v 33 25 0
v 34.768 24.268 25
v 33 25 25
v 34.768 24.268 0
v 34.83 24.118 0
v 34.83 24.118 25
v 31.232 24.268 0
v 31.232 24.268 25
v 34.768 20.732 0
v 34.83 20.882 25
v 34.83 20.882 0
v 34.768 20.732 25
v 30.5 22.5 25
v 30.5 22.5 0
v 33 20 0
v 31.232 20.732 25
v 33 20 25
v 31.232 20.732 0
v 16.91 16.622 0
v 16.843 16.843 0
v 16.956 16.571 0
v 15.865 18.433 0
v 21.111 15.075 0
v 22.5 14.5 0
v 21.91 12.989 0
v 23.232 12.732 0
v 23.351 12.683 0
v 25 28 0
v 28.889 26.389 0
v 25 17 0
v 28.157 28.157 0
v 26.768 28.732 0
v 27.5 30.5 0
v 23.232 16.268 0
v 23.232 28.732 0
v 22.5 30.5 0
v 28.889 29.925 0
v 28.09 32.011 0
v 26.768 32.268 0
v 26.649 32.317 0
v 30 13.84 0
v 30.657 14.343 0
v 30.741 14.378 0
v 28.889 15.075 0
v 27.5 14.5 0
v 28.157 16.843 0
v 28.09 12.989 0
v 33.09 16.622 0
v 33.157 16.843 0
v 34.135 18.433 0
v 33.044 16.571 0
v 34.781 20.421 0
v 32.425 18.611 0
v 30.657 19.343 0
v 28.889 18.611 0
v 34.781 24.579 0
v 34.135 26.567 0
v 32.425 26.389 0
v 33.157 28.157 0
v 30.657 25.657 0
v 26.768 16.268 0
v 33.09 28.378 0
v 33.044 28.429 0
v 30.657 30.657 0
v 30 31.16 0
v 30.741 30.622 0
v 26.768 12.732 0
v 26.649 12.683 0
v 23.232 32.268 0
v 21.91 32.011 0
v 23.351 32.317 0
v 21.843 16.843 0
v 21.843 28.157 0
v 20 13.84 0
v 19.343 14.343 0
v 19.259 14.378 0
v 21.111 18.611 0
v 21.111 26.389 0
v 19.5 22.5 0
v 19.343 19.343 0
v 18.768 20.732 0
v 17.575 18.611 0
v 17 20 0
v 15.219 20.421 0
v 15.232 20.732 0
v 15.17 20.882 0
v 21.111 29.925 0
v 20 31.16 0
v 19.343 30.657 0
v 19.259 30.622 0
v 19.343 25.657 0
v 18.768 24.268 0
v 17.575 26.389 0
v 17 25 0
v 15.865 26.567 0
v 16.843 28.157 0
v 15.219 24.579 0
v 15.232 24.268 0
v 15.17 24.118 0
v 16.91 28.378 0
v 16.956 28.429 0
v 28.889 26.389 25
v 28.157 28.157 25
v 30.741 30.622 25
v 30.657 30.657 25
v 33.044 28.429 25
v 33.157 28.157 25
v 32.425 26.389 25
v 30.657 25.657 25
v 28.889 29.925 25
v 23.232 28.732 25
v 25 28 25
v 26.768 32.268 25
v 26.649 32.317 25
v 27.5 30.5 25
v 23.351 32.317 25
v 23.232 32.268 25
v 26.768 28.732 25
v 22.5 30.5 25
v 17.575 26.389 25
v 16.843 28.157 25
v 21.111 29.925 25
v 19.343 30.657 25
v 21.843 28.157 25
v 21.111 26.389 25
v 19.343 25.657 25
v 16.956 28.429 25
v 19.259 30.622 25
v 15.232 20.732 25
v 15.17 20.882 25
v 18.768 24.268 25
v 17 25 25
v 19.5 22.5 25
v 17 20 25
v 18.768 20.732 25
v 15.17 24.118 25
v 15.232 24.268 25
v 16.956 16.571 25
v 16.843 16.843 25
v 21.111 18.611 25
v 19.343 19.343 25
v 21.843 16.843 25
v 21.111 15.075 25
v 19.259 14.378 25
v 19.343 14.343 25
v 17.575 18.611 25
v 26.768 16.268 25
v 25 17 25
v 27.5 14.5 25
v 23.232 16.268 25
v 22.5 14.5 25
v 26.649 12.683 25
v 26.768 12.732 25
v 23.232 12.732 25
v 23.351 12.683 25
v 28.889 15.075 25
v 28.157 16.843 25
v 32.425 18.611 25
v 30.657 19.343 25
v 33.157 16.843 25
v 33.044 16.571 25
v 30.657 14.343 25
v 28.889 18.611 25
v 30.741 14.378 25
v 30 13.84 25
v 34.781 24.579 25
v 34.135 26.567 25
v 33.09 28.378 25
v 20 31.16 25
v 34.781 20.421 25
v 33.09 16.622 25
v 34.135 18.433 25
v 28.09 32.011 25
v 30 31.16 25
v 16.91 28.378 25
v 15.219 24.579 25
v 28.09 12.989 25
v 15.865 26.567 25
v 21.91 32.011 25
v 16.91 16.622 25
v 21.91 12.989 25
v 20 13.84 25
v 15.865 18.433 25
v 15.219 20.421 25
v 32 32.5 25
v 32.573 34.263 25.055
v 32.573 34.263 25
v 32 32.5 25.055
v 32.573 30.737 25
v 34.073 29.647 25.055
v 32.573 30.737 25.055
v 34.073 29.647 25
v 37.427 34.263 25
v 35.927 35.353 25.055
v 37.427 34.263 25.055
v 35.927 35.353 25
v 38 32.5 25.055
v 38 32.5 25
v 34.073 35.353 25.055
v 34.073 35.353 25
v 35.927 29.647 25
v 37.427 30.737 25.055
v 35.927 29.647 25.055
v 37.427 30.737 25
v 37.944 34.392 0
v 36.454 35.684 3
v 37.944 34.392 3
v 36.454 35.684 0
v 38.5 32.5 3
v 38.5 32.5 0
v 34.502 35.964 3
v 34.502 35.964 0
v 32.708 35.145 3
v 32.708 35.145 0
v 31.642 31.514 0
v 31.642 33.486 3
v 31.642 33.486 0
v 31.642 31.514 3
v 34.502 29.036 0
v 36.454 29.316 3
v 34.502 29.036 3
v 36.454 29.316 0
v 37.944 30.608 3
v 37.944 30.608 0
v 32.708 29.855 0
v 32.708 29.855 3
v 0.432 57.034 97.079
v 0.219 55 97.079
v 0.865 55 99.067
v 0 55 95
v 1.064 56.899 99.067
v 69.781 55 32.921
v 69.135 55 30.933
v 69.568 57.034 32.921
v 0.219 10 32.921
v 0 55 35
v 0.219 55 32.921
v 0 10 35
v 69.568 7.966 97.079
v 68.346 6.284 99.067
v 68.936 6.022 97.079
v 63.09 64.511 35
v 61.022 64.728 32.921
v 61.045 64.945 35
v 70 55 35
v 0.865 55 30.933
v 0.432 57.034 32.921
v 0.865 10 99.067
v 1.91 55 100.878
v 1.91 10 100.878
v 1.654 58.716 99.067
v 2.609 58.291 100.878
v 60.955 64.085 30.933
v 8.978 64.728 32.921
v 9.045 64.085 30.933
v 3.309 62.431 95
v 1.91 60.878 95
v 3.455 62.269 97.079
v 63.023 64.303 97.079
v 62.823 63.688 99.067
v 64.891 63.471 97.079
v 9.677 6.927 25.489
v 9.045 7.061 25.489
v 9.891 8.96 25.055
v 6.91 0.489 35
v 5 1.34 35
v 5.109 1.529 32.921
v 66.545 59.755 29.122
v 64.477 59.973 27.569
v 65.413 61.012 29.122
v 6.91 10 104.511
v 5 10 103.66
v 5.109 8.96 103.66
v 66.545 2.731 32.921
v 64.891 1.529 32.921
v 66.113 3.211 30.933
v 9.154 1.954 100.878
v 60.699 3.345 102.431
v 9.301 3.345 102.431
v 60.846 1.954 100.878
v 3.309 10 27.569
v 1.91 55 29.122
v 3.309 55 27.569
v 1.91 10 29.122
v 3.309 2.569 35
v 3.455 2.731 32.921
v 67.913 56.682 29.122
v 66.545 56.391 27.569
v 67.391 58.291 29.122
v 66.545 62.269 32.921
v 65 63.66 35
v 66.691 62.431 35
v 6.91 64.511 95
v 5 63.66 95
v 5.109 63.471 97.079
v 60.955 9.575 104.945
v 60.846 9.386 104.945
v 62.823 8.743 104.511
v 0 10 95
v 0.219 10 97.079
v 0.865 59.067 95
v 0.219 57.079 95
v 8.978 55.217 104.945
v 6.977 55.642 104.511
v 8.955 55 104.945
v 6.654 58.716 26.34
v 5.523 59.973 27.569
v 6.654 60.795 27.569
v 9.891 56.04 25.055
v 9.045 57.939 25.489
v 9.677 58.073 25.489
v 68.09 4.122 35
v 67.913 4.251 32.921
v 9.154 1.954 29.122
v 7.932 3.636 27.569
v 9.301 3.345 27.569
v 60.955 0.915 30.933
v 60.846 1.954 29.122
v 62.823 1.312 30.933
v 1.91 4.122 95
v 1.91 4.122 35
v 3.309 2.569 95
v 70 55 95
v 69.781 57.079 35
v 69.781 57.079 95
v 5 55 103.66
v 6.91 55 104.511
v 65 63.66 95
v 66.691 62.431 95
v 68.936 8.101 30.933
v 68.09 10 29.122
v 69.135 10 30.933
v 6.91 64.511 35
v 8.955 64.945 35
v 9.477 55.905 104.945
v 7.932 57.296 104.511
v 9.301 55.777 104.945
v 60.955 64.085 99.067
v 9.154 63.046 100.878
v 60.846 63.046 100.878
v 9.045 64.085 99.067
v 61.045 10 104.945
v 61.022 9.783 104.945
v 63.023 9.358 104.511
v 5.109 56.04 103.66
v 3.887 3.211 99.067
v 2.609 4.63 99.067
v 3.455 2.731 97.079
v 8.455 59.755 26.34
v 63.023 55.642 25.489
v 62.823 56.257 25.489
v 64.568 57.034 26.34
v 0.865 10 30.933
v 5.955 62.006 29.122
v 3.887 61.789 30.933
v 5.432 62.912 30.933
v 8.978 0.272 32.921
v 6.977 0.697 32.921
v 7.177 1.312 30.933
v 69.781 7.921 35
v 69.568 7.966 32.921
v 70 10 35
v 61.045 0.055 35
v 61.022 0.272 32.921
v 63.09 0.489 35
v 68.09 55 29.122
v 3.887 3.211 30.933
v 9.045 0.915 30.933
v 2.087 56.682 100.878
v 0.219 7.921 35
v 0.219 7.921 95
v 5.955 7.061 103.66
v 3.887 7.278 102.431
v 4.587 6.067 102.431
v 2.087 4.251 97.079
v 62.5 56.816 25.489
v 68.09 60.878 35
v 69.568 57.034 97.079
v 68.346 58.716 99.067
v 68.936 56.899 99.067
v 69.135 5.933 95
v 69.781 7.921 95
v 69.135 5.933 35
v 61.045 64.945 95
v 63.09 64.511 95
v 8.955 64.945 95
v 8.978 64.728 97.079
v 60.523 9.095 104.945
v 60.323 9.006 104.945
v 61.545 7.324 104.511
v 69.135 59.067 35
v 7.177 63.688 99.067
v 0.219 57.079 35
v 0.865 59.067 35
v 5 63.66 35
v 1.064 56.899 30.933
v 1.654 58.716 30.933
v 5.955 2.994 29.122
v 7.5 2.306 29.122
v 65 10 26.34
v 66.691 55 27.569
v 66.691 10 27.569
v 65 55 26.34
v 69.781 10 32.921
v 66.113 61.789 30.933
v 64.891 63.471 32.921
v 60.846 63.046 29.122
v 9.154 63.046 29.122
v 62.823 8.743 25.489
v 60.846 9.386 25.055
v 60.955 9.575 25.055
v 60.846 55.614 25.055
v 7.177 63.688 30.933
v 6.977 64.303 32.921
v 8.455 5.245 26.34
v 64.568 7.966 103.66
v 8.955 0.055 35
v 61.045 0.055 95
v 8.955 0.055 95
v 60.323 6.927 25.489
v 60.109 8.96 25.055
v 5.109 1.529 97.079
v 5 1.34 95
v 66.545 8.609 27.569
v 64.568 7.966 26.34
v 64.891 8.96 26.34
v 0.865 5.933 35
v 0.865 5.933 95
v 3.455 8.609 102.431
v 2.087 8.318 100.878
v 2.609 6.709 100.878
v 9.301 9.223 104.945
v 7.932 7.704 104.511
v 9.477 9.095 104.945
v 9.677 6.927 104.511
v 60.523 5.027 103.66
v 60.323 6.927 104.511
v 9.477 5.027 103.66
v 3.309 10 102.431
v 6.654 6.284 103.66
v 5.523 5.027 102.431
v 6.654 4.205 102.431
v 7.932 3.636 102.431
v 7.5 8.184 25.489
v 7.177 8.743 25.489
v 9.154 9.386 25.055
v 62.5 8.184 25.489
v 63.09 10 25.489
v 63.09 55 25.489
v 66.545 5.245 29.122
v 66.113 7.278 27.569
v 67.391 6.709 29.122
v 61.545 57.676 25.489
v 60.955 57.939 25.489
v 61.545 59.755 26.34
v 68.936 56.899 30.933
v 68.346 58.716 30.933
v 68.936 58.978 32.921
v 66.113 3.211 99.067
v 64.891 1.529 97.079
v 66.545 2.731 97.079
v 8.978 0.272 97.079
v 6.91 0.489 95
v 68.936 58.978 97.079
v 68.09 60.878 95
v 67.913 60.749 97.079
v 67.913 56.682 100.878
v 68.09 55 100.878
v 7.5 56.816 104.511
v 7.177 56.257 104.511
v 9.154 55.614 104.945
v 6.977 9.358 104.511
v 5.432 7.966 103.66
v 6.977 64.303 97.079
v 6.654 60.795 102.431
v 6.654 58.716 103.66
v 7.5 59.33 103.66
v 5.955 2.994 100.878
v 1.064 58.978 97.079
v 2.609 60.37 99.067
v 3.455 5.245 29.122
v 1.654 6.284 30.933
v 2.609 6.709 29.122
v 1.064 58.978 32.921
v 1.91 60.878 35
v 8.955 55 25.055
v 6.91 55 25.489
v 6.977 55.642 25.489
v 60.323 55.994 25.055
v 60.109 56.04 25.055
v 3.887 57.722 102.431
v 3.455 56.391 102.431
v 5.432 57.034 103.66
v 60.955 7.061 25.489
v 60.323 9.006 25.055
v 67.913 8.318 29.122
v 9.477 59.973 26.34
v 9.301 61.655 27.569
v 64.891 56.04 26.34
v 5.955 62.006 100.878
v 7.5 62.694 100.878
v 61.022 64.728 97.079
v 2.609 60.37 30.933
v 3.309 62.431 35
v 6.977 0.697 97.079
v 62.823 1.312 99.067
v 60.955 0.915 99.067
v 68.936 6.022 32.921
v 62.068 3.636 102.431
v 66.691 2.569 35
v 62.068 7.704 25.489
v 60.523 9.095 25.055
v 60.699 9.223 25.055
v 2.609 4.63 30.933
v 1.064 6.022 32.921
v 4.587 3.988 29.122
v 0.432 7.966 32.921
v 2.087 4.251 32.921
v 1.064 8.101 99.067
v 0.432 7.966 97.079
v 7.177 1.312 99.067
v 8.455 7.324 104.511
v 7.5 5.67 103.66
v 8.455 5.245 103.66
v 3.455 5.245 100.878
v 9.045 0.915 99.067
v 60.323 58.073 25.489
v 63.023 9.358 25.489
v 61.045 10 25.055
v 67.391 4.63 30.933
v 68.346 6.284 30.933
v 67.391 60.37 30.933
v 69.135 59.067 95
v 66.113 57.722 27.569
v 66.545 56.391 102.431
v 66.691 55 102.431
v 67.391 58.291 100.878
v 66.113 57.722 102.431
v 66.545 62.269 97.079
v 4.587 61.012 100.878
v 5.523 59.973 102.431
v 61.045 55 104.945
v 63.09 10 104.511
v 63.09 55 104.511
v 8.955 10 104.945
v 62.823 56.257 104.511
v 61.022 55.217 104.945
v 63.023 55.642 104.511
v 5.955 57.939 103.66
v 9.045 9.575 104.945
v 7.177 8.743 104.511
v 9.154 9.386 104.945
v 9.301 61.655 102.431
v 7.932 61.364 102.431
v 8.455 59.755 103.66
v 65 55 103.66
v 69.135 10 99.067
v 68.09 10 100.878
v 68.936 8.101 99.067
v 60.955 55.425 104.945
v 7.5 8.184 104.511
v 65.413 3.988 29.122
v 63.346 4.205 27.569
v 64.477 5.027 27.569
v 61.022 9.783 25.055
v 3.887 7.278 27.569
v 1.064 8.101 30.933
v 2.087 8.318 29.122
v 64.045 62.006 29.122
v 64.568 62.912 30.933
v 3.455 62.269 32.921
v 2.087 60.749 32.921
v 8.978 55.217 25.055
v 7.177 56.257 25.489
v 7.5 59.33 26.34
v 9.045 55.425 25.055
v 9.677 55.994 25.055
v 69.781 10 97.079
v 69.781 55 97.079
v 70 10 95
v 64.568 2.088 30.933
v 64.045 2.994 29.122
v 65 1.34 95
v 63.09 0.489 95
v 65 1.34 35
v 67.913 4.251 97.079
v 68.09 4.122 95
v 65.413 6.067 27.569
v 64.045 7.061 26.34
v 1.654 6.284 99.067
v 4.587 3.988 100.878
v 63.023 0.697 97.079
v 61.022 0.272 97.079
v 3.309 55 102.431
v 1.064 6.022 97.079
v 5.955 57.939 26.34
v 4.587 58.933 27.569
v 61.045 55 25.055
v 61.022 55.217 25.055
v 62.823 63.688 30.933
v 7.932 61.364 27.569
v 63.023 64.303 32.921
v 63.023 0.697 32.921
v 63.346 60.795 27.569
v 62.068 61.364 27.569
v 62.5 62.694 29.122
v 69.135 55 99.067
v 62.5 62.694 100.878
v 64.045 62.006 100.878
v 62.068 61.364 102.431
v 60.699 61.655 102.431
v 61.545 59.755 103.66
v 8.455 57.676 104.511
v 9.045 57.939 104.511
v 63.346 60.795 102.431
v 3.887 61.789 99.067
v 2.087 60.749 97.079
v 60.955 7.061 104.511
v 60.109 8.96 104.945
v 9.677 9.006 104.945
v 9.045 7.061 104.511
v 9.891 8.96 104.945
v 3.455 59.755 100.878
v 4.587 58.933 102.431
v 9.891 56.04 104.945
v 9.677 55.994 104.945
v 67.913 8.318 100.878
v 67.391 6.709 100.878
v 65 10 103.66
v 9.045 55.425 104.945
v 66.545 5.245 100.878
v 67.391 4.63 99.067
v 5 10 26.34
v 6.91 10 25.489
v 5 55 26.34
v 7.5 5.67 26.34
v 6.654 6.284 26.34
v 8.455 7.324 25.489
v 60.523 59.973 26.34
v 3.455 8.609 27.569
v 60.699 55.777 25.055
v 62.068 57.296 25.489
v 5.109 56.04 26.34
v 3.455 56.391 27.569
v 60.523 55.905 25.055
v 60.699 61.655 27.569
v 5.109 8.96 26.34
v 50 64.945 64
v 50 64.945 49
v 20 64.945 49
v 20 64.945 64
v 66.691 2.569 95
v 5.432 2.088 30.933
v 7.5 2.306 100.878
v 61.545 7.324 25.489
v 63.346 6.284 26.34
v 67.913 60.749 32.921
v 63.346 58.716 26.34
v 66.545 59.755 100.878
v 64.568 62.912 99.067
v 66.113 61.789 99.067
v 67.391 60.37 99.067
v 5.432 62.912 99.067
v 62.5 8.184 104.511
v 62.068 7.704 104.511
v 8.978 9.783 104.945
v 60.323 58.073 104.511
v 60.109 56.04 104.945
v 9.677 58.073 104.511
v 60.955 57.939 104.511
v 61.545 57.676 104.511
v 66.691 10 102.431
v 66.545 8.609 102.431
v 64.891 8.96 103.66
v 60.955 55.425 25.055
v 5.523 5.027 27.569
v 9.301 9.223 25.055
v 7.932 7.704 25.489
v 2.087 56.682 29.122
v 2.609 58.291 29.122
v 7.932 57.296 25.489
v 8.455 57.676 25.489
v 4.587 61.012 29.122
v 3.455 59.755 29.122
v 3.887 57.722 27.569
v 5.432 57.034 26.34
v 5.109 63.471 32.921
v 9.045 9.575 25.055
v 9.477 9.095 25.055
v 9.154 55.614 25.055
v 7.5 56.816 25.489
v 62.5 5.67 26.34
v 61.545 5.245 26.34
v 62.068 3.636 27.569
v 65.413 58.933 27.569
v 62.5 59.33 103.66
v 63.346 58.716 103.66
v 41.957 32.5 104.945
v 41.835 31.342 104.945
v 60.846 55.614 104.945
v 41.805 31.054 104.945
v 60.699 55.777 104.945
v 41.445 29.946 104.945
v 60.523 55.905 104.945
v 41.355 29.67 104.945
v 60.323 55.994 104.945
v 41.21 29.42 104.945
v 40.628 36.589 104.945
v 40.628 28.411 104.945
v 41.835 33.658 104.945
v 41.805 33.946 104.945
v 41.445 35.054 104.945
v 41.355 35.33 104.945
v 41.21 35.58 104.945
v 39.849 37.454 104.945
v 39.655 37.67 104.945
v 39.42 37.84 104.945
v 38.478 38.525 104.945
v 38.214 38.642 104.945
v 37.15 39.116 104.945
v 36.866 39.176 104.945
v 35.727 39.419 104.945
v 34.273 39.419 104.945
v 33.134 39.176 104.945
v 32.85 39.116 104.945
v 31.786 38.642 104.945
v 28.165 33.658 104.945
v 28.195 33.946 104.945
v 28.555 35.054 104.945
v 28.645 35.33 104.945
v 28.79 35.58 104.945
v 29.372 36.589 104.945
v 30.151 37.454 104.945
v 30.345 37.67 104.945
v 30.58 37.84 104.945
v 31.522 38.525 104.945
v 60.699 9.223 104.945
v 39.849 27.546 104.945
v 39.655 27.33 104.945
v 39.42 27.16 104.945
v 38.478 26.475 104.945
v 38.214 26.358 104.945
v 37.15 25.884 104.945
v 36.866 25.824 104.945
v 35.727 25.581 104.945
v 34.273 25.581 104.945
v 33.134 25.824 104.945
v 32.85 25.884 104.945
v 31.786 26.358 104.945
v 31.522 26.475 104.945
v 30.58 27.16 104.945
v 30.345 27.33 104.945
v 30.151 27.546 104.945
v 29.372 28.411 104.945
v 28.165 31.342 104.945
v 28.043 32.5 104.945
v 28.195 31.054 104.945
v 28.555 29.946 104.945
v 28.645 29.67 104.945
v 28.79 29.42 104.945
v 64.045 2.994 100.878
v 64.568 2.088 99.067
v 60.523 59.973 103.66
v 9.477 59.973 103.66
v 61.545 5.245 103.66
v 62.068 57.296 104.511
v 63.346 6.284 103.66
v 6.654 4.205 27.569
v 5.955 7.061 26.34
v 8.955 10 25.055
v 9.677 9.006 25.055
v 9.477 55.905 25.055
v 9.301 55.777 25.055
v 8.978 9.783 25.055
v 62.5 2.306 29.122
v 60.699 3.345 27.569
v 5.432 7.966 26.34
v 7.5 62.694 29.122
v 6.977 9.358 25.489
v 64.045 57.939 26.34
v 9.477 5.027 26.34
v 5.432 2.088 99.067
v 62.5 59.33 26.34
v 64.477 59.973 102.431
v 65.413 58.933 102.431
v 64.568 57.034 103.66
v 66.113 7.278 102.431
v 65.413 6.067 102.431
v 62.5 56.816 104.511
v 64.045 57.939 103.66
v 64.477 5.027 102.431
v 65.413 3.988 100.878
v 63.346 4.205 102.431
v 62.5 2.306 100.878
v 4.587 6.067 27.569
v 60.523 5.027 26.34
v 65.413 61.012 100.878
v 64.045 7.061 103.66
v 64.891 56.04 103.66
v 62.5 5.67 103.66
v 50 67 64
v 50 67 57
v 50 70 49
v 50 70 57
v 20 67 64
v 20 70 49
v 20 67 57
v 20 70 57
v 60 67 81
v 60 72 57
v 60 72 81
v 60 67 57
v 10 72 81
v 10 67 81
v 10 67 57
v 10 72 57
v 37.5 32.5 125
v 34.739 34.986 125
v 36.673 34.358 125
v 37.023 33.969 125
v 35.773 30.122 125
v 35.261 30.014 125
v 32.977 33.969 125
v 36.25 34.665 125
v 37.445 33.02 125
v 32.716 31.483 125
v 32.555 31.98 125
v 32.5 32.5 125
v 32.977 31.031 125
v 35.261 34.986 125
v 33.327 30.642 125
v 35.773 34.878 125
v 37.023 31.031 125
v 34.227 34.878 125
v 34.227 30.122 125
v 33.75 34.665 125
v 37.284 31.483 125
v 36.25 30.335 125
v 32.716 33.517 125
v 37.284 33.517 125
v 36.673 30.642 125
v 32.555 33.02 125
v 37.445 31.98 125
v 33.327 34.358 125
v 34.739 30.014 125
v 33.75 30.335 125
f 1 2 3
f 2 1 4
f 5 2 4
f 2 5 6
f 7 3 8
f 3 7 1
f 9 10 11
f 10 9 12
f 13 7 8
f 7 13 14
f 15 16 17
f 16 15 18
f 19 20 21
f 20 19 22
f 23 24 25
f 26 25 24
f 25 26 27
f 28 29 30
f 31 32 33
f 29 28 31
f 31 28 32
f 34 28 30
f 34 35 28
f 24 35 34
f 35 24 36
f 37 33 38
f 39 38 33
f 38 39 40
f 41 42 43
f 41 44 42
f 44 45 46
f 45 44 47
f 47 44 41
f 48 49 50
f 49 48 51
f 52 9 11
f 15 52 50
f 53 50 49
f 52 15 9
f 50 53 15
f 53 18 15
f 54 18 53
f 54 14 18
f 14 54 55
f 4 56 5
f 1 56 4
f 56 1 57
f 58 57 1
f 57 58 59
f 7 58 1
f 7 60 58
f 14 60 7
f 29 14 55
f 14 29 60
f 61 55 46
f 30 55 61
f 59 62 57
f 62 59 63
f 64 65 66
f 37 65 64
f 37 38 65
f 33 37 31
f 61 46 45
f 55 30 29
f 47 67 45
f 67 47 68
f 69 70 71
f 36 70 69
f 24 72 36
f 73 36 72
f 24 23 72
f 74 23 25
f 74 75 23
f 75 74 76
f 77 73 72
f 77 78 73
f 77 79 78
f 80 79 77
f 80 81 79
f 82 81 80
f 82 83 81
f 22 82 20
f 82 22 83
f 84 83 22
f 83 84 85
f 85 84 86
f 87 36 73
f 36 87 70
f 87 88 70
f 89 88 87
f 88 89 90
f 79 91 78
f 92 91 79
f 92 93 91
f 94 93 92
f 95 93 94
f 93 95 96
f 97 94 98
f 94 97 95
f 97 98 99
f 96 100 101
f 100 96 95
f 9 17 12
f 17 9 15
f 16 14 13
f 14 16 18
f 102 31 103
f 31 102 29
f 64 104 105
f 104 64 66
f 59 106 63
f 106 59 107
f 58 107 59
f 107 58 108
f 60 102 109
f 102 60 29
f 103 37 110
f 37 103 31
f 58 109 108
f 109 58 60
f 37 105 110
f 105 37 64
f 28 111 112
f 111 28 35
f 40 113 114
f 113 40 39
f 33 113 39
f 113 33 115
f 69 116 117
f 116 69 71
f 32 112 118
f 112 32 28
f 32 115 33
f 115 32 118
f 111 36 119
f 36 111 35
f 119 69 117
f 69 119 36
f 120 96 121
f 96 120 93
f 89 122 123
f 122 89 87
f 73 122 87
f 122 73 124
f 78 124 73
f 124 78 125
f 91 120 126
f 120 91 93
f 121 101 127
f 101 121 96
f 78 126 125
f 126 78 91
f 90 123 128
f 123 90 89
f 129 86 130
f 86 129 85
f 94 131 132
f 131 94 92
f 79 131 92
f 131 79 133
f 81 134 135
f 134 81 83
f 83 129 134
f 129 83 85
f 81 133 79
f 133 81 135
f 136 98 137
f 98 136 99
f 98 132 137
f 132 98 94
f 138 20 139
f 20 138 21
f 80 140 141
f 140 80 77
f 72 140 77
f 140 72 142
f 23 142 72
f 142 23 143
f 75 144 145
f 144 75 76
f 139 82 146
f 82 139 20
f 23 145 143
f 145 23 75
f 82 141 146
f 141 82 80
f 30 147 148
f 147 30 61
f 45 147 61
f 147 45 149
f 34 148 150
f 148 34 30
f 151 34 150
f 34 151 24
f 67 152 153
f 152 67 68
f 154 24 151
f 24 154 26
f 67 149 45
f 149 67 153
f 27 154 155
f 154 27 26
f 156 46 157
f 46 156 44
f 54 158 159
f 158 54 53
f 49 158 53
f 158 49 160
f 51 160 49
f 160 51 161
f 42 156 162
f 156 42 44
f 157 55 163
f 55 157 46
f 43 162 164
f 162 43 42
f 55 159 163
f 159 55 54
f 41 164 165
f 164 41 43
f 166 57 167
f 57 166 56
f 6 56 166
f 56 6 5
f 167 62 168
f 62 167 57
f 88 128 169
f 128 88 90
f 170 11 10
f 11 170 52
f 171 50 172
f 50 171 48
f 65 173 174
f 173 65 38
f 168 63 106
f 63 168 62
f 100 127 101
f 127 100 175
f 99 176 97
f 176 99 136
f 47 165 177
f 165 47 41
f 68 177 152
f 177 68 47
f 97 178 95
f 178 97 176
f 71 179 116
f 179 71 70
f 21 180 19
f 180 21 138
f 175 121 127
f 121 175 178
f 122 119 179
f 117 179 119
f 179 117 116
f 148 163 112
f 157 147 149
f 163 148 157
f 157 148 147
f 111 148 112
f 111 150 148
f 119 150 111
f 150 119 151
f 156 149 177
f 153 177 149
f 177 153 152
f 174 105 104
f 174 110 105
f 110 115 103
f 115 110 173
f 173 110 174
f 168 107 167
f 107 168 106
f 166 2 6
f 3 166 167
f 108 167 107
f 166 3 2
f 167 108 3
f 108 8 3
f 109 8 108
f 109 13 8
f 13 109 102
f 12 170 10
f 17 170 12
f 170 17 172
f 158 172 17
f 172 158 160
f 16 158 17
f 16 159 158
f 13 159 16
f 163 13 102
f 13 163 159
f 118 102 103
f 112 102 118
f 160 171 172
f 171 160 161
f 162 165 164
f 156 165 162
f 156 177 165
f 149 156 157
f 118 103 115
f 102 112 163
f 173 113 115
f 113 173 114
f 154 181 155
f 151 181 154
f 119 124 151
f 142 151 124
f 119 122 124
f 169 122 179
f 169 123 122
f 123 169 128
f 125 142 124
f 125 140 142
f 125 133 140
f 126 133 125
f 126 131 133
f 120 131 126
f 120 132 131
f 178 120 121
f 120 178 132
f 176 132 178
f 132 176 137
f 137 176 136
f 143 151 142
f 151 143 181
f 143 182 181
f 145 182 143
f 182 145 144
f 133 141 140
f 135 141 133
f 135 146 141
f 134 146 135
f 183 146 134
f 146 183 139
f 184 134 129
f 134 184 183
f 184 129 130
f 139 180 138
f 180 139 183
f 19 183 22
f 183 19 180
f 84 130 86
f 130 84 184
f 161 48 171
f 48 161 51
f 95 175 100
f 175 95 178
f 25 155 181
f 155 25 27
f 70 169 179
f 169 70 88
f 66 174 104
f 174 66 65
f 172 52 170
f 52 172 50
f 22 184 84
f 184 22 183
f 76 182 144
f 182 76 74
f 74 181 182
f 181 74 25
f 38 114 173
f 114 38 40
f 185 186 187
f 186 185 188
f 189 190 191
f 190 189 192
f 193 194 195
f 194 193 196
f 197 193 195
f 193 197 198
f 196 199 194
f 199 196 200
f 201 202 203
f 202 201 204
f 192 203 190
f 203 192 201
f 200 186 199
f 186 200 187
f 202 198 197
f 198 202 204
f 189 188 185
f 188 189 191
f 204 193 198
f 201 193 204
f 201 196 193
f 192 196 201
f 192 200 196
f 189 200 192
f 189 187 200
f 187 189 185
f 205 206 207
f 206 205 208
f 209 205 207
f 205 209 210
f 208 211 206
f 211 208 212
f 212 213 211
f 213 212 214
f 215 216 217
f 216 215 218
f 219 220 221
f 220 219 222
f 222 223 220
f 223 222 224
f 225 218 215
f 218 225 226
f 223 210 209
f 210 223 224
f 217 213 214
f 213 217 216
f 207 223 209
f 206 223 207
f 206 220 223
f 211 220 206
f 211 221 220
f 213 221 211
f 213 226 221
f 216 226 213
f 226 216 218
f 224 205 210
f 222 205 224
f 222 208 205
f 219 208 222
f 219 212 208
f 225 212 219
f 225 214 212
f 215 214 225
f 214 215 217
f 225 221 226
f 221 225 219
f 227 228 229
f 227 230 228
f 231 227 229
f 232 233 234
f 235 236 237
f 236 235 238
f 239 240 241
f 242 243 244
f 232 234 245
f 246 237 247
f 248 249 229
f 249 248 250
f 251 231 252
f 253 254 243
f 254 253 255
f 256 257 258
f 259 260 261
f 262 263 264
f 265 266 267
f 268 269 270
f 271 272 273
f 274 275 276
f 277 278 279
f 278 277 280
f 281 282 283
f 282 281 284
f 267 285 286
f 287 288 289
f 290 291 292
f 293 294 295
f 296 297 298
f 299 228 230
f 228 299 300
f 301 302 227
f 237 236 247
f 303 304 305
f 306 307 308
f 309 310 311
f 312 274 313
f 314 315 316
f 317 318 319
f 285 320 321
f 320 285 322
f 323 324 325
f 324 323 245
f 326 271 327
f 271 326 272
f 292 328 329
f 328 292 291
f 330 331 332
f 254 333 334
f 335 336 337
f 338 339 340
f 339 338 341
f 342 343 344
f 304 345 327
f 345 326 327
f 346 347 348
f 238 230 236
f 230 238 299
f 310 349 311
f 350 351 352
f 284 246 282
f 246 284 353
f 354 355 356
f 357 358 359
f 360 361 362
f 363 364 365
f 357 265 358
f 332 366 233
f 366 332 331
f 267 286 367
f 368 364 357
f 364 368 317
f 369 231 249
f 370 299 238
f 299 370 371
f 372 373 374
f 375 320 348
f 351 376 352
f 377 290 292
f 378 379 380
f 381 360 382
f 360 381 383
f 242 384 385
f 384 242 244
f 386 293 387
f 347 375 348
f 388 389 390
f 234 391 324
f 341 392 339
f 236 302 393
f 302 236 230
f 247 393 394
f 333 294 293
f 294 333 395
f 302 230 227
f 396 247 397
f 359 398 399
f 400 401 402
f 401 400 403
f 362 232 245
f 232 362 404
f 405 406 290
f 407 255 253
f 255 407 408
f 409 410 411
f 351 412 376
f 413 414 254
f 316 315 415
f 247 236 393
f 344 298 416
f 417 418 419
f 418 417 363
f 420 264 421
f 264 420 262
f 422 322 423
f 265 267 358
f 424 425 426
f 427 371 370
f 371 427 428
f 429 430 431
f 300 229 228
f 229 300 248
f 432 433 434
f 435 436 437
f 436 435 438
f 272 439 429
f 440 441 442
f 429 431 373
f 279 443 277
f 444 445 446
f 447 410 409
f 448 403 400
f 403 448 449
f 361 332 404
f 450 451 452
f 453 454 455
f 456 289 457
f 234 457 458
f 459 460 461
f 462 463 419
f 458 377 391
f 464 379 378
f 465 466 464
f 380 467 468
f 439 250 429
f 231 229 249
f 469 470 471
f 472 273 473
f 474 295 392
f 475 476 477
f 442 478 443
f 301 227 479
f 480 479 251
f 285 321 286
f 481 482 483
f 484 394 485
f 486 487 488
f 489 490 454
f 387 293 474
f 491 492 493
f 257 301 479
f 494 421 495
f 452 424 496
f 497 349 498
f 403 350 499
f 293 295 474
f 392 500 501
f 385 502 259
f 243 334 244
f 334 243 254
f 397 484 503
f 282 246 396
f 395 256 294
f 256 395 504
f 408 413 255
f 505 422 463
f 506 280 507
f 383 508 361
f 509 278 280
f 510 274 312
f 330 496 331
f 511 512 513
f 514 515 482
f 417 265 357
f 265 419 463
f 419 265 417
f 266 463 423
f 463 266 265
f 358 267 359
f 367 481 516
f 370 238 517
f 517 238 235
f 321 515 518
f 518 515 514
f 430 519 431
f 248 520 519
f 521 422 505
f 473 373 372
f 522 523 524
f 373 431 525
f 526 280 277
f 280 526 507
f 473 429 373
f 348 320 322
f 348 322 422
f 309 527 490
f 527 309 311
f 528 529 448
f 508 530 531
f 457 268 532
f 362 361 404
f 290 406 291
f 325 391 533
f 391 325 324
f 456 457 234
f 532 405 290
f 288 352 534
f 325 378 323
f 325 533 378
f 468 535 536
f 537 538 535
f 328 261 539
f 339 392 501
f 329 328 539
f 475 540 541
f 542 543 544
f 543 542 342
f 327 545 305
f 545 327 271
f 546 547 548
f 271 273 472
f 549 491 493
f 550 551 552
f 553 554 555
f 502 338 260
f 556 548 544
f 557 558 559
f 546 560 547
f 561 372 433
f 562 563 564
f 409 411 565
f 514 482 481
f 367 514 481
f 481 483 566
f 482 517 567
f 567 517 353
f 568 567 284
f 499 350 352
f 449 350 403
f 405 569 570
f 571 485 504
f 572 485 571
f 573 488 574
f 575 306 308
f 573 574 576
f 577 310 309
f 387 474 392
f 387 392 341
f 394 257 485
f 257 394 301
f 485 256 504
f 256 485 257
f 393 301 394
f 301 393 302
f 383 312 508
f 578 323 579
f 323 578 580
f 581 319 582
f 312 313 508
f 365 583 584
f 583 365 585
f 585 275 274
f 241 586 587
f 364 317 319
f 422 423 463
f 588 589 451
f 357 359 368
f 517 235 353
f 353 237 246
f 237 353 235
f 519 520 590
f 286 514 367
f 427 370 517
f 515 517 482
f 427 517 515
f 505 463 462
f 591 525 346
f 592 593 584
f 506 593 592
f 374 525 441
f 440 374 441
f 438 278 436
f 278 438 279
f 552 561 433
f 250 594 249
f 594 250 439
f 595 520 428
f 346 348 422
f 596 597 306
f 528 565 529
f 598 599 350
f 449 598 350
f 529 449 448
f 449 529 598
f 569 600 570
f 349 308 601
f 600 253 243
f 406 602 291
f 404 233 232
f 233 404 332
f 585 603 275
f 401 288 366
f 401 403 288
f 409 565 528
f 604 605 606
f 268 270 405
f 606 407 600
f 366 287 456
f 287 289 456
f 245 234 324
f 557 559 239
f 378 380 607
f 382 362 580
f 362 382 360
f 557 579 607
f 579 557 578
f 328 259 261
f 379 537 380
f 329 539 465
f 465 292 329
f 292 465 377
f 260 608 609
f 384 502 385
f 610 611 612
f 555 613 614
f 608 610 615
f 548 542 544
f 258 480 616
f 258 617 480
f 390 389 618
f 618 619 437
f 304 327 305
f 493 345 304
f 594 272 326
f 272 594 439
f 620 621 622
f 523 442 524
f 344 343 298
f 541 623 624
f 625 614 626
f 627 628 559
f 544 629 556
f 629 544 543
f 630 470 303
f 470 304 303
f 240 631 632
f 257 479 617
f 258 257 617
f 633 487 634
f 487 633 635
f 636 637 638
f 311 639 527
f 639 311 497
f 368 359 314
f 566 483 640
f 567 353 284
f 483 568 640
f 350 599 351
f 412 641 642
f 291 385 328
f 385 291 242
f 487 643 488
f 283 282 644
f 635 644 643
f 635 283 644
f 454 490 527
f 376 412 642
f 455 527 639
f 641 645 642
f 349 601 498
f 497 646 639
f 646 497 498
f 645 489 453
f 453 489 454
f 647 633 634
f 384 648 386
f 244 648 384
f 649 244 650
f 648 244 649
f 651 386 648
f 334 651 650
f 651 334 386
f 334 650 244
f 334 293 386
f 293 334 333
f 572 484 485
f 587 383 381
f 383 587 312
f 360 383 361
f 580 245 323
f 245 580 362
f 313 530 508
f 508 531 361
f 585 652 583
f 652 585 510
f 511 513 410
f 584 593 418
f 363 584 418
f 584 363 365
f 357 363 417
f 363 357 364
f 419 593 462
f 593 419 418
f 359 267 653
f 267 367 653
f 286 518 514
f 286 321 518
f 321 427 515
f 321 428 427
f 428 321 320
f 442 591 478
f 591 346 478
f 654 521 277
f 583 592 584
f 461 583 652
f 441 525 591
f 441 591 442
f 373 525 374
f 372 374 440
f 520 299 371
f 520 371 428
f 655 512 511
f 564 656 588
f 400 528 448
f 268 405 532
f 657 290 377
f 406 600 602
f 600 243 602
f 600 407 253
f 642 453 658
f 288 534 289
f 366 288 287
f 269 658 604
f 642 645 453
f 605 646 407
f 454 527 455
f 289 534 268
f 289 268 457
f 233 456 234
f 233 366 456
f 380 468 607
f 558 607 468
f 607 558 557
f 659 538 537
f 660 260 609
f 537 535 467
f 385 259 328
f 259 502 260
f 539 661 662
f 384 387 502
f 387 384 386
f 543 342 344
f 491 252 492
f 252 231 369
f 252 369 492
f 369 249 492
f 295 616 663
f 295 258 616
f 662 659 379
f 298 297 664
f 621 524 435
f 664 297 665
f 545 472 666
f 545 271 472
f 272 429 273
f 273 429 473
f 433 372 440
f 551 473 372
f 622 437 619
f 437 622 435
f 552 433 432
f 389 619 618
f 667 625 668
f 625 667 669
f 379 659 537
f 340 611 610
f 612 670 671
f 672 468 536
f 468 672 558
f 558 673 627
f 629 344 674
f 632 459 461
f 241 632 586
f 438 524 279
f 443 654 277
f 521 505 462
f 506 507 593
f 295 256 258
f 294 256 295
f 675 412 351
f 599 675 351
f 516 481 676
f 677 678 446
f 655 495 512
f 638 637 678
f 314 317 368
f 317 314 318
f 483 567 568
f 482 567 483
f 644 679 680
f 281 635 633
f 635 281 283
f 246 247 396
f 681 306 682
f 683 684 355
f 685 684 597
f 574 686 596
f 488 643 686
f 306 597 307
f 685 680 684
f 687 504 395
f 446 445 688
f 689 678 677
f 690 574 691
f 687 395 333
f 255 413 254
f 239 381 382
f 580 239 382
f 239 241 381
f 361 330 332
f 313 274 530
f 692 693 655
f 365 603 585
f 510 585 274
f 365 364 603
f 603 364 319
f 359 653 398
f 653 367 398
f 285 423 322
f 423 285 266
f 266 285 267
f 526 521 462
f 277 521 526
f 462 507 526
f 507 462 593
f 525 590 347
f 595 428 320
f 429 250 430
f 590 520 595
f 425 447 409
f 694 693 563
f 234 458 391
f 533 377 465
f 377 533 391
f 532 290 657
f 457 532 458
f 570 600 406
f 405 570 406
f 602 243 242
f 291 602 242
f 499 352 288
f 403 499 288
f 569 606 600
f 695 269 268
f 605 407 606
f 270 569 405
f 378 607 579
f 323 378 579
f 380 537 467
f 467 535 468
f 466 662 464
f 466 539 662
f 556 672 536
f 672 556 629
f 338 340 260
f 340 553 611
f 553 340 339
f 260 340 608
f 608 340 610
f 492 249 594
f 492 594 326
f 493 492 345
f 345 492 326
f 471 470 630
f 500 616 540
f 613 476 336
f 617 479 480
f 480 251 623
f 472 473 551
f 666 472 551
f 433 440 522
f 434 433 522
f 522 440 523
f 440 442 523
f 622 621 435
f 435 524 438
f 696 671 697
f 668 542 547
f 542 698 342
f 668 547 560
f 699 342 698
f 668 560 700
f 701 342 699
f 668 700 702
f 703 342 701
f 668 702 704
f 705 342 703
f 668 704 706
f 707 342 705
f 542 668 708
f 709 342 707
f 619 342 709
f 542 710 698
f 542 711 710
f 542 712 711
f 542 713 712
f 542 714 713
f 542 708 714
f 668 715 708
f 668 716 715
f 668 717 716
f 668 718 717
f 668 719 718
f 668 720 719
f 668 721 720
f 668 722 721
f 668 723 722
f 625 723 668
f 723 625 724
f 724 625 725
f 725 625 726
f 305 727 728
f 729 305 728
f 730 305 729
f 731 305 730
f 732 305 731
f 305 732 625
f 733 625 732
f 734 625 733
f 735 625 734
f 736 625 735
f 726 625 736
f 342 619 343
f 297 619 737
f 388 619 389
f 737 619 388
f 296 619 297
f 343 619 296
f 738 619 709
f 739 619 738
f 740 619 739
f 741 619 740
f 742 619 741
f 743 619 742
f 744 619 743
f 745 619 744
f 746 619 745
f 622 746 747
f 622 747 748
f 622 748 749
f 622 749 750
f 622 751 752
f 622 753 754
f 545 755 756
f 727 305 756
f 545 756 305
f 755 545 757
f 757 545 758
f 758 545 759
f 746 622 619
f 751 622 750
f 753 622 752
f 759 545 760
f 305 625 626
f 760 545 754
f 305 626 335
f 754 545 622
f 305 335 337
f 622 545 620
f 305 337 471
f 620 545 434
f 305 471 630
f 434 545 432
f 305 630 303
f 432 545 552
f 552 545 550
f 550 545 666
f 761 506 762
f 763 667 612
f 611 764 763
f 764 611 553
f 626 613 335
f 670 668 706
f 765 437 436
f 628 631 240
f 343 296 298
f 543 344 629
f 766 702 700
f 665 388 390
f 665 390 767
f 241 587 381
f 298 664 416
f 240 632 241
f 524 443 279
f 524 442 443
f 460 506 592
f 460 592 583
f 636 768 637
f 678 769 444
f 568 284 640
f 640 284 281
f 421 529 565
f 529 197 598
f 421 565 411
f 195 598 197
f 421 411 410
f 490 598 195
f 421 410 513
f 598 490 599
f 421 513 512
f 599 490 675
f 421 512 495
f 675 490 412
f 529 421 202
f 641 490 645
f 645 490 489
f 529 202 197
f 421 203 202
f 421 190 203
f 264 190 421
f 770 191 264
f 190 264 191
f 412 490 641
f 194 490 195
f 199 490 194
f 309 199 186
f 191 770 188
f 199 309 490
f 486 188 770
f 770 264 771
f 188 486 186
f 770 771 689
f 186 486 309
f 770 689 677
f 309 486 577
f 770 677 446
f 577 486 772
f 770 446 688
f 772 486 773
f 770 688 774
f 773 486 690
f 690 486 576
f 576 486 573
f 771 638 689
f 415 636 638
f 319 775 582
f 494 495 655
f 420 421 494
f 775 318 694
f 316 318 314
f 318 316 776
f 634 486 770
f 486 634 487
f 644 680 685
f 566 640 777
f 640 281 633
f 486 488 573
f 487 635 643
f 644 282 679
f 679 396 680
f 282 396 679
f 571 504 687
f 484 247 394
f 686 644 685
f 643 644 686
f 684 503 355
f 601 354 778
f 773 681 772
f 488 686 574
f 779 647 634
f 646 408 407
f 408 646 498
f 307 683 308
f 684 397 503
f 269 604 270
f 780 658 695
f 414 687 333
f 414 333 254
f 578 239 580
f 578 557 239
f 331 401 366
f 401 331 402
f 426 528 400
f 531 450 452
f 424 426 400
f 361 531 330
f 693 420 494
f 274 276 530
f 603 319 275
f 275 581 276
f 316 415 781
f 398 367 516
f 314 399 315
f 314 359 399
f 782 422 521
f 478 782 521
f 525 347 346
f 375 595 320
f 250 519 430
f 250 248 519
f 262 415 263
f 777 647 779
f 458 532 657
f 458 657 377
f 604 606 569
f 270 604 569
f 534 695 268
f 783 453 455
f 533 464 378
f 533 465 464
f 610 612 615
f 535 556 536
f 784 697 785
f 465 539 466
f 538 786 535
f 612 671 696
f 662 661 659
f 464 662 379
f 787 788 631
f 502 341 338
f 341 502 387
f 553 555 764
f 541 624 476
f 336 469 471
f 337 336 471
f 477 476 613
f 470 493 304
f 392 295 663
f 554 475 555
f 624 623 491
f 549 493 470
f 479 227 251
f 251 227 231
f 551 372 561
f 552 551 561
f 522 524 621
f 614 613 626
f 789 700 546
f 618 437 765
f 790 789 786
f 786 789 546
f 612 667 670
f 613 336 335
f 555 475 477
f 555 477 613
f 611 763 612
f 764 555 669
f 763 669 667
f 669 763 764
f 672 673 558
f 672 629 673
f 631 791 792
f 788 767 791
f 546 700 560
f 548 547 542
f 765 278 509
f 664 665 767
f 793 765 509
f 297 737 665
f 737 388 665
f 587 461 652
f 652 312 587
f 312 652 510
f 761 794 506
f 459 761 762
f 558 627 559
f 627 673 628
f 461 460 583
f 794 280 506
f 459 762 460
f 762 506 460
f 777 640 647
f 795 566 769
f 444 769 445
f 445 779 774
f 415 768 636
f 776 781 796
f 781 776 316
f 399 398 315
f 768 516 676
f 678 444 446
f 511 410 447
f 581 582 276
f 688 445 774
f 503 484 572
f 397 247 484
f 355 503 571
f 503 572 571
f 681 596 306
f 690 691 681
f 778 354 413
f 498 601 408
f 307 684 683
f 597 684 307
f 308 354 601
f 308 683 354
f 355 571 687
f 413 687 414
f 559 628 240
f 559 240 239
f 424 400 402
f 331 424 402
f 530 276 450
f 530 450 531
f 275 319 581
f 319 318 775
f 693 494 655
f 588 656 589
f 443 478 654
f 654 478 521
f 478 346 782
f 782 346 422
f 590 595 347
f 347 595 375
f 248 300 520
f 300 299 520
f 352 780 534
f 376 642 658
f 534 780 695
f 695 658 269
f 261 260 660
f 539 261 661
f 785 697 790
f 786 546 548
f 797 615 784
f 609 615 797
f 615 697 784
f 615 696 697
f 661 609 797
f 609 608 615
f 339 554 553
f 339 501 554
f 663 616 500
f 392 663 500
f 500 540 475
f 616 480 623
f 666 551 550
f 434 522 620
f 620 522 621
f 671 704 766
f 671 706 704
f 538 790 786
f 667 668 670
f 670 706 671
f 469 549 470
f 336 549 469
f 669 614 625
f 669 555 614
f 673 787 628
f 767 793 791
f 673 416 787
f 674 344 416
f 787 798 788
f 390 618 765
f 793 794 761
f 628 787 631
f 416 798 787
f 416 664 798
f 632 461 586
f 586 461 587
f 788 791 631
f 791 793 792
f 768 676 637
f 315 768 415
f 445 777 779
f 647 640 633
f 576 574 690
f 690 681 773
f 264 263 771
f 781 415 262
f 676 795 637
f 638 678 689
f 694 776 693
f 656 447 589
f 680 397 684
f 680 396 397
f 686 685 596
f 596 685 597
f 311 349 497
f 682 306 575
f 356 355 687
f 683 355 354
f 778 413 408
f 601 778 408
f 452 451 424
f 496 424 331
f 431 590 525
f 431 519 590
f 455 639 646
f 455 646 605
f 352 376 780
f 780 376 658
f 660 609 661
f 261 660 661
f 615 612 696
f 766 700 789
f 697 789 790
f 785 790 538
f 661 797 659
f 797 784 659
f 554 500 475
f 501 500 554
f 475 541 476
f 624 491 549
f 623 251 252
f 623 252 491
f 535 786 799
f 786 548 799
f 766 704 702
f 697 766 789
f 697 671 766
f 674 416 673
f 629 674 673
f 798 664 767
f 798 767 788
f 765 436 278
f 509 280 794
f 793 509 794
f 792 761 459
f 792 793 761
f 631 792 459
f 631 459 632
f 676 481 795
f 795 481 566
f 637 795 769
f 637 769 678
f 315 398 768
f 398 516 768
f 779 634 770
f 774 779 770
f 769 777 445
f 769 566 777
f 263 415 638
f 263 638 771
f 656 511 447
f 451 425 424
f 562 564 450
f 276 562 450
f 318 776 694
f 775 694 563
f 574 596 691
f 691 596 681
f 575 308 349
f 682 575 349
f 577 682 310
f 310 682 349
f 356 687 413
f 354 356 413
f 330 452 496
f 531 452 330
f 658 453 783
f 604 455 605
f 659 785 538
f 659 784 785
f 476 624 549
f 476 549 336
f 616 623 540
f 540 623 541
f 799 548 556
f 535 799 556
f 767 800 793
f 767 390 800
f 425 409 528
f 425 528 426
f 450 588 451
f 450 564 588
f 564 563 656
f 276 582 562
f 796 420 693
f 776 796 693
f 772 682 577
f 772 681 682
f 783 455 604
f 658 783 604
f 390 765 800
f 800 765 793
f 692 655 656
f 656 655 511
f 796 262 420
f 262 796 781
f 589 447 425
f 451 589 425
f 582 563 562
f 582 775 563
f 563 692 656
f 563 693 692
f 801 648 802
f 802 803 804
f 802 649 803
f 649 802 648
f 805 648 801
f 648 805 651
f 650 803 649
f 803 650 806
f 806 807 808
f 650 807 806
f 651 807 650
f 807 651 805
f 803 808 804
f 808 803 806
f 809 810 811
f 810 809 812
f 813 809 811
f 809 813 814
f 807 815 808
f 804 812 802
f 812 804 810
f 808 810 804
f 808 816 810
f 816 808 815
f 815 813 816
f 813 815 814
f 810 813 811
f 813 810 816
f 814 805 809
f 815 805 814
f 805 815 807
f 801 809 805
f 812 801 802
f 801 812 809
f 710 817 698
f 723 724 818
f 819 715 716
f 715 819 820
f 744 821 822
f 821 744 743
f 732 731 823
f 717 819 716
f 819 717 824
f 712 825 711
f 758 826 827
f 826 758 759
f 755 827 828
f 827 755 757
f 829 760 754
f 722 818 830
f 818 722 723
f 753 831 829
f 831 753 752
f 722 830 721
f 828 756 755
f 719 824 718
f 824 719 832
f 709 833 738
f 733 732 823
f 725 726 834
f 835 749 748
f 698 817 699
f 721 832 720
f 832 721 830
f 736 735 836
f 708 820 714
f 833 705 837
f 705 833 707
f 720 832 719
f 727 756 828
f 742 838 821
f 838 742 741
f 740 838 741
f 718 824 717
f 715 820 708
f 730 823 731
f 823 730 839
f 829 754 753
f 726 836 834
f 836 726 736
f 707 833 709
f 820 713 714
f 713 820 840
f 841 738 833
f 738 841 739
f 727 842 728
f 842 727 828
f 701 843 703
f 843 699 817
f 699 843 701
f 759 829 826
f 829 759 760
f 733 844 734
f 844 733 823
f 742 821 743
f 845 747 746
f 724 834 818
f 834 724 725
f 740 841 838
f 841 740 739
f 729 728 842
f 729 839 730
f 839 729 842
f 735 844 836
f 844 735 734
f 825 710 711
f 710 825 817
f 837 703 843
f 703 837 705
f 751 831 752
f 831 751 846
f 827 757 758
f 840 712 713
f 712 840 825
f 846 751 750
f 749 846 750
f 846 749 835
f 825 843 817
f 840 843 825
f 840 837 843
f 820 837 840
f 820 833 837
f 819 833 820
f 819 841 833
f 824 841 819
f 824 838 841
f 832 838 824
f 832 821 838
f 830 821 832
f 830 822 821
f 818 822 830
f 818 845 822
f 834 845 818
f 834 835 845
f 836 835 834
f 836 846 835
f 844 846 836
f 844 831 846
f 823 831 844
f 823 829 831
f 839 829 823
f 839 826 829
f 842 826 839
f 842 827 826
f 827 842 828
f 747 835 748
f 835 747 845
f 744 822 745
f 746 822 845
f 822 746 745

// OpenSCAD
// PERCY UNIT v1 - HEAD AND NECK MODULE WITH SNAP-FITS
// Connects to chest plate via neck

// Parameters
neck_dia = 20;
neck_length = 25;
neck_depth = 15;

head_width = 70;
head_height = 80;
head_depth = 65;

eye_dia = 25;
eye_spacing = 30;
eye_offset_z = 10;

ear_height = 45;
ear_width = 25;
ear_depth = 15;
ear_offset_x = 40;
ear_offset_z = 50;

snap_dia = 6;
snap_height = 5;

// NECK MODULE
module neck() {
    // Main neck cylinder
    difference() {
        cylinder(d=neck_dia, h=neck_length);
        
        // Lightening holes
        for (angle = [0:45:359]) {
            translate([neck_dia*0.4 * cos(angle), neck_dia*0.4 * sin(angle), 0])
                cylinder(d=5, h=neck_length + 1);
        }
    }
    
    // Top snap-fit male (for head connection)
    translate([neck_dia/2, neck_dia/2, neck_length])
        cylinder(d=snap_dia, h=snap_height);
    
    // Bottom snap-fit female (for chest connection)
    translate([neck_dia/2, neck_dia/2, 0])
        cylinder(d=snap_dia + 1, h=3);
}

// HEAD MODULE
module percy_head() {
    // Main head shape (rounded box)
    hull() {
        translate([10, 10, 10])
            sphere(r=10);
        translate([head_width - 10, 10, 10])
            sphere(r=10);
        translate([10, head_depth - 10, 10])
            sphere(r=10);
        translate([head_width - 10, head_depth - 10, 10])
            sphere(r=10);
        translate([10, 10, head_height - 10])
            sphere(r=10);
        translate([head_width - 10, 10, head_height - 10])
            sphere(r=10);
        translate([10, head_depth - 10, head_height - 10])
            sphere(r=10);
        translate([head_width - 10, head_depth - 10, head_height - 10])
            sphere(r=10);
    }
    
    // Eye sockets (large holes for LED eyes)
    eye_x_start = head_width/2 - eye_spacing/2;
    eye_x_end = head_width/2 + eye_spacing/2;
    
    translate([eye_x_start, head_depth/2, eye_offset_z])
        cylinder(d=eye_dia, h=20);
    translate([eye_x_end, head_depth/2, eye_offset_z])
        cylinder(d=eye_dia, h=20);
    
    // Eye glow rings
    translate([eye_x_start, head_depth/2, eye_offset_z])
        cylinder(d=eye_dia + 3, h=3);
    translate([eye_x_end, head_depth/2, eye_offset_z])
        cylinder(d=eye_dia + 3, h=3);
    
    // Mouth slot
    translate([head_width/2 - 15, head_depth - 5, head_height*0.3])
        cube([30, 10, 15]);
    
    // Visor groove (for face shield)
    translate([10, head_depth + 2, head_height*0.4])
        cube([head_width - 20, 5, head_height*0.3]);
}

// CAT EARS (attach to head)
module cat_ear(is_left) {
    ear_x = is_left ? -ear_offset_x : head_width + ear_offset_x;
    mirror_x = is_left ? -1 : 1;
    
    translate([head_width/2, head_depth/2, head_height]) {
        // Main ear cone
        translate([0, 0,0])
            cylinder(d1=ear_width, d2=5, h=ear_height);
        
        // Inner ear detail
        translate([0, 0, 5])
            cylinder(d1=ear_width*0.6, d2=3, h=ear_height*0.8);
        
        // LED strip slot
        translate([0, 0, ear_height*0.5])
            cylinder(d=3, h=ear_height*0.3);
    }
}

// Full head assembly with neck
module head_with_neck() {
    // Neck
    translate([head_width/2 - neck_dia/2, head_depth/2 - neck_dia/2, 0])
        neck();
    
    // Head on top of neck
    translate([0, 0, neck_length])
        percy_head();
    
    // Cat ears
    translate([0, 0, 0])
        cat_ear(true);  // Left ear
    translate([0, 0, 0])
        cat_ear(false);  // Right ear
}

// SNAP-FIT MOUNTING BRACKET (for chest connection)
module chest_neck_bracket() {
    bracket_width = 40;
    bracket_height = 30;
    
    difference() {
        hull() {
            translate([5, 5, 0])
                cylinder(r=5, h=5);
            translate([bracket_width - 5, 5, 0])
                cylinder(r=5, h=5);
            translate([5, bracket_height - 5, 0])
                cylinder(r=5, h=5);
            translate([bracket_width - 5, bracket_height - 5, 0])
                cylinder(r=5, h=5);
        }
        
        // Snap-fit females
        translate([10, bracket_height/2, -1])
            cylinder(d=snap_dia + 1, h=7);
        translate([bracket_width - 10, bracket_height/2, -1])
            cylinder(d=snap_dia + 1, h=7);
    }
}

// Export head with neck
head_with_neck();

// Or export parts separately:
// neck();
// percy_head();
// cat_ear(true);
// cat_ear(false);
// chest_neck_bracket();
